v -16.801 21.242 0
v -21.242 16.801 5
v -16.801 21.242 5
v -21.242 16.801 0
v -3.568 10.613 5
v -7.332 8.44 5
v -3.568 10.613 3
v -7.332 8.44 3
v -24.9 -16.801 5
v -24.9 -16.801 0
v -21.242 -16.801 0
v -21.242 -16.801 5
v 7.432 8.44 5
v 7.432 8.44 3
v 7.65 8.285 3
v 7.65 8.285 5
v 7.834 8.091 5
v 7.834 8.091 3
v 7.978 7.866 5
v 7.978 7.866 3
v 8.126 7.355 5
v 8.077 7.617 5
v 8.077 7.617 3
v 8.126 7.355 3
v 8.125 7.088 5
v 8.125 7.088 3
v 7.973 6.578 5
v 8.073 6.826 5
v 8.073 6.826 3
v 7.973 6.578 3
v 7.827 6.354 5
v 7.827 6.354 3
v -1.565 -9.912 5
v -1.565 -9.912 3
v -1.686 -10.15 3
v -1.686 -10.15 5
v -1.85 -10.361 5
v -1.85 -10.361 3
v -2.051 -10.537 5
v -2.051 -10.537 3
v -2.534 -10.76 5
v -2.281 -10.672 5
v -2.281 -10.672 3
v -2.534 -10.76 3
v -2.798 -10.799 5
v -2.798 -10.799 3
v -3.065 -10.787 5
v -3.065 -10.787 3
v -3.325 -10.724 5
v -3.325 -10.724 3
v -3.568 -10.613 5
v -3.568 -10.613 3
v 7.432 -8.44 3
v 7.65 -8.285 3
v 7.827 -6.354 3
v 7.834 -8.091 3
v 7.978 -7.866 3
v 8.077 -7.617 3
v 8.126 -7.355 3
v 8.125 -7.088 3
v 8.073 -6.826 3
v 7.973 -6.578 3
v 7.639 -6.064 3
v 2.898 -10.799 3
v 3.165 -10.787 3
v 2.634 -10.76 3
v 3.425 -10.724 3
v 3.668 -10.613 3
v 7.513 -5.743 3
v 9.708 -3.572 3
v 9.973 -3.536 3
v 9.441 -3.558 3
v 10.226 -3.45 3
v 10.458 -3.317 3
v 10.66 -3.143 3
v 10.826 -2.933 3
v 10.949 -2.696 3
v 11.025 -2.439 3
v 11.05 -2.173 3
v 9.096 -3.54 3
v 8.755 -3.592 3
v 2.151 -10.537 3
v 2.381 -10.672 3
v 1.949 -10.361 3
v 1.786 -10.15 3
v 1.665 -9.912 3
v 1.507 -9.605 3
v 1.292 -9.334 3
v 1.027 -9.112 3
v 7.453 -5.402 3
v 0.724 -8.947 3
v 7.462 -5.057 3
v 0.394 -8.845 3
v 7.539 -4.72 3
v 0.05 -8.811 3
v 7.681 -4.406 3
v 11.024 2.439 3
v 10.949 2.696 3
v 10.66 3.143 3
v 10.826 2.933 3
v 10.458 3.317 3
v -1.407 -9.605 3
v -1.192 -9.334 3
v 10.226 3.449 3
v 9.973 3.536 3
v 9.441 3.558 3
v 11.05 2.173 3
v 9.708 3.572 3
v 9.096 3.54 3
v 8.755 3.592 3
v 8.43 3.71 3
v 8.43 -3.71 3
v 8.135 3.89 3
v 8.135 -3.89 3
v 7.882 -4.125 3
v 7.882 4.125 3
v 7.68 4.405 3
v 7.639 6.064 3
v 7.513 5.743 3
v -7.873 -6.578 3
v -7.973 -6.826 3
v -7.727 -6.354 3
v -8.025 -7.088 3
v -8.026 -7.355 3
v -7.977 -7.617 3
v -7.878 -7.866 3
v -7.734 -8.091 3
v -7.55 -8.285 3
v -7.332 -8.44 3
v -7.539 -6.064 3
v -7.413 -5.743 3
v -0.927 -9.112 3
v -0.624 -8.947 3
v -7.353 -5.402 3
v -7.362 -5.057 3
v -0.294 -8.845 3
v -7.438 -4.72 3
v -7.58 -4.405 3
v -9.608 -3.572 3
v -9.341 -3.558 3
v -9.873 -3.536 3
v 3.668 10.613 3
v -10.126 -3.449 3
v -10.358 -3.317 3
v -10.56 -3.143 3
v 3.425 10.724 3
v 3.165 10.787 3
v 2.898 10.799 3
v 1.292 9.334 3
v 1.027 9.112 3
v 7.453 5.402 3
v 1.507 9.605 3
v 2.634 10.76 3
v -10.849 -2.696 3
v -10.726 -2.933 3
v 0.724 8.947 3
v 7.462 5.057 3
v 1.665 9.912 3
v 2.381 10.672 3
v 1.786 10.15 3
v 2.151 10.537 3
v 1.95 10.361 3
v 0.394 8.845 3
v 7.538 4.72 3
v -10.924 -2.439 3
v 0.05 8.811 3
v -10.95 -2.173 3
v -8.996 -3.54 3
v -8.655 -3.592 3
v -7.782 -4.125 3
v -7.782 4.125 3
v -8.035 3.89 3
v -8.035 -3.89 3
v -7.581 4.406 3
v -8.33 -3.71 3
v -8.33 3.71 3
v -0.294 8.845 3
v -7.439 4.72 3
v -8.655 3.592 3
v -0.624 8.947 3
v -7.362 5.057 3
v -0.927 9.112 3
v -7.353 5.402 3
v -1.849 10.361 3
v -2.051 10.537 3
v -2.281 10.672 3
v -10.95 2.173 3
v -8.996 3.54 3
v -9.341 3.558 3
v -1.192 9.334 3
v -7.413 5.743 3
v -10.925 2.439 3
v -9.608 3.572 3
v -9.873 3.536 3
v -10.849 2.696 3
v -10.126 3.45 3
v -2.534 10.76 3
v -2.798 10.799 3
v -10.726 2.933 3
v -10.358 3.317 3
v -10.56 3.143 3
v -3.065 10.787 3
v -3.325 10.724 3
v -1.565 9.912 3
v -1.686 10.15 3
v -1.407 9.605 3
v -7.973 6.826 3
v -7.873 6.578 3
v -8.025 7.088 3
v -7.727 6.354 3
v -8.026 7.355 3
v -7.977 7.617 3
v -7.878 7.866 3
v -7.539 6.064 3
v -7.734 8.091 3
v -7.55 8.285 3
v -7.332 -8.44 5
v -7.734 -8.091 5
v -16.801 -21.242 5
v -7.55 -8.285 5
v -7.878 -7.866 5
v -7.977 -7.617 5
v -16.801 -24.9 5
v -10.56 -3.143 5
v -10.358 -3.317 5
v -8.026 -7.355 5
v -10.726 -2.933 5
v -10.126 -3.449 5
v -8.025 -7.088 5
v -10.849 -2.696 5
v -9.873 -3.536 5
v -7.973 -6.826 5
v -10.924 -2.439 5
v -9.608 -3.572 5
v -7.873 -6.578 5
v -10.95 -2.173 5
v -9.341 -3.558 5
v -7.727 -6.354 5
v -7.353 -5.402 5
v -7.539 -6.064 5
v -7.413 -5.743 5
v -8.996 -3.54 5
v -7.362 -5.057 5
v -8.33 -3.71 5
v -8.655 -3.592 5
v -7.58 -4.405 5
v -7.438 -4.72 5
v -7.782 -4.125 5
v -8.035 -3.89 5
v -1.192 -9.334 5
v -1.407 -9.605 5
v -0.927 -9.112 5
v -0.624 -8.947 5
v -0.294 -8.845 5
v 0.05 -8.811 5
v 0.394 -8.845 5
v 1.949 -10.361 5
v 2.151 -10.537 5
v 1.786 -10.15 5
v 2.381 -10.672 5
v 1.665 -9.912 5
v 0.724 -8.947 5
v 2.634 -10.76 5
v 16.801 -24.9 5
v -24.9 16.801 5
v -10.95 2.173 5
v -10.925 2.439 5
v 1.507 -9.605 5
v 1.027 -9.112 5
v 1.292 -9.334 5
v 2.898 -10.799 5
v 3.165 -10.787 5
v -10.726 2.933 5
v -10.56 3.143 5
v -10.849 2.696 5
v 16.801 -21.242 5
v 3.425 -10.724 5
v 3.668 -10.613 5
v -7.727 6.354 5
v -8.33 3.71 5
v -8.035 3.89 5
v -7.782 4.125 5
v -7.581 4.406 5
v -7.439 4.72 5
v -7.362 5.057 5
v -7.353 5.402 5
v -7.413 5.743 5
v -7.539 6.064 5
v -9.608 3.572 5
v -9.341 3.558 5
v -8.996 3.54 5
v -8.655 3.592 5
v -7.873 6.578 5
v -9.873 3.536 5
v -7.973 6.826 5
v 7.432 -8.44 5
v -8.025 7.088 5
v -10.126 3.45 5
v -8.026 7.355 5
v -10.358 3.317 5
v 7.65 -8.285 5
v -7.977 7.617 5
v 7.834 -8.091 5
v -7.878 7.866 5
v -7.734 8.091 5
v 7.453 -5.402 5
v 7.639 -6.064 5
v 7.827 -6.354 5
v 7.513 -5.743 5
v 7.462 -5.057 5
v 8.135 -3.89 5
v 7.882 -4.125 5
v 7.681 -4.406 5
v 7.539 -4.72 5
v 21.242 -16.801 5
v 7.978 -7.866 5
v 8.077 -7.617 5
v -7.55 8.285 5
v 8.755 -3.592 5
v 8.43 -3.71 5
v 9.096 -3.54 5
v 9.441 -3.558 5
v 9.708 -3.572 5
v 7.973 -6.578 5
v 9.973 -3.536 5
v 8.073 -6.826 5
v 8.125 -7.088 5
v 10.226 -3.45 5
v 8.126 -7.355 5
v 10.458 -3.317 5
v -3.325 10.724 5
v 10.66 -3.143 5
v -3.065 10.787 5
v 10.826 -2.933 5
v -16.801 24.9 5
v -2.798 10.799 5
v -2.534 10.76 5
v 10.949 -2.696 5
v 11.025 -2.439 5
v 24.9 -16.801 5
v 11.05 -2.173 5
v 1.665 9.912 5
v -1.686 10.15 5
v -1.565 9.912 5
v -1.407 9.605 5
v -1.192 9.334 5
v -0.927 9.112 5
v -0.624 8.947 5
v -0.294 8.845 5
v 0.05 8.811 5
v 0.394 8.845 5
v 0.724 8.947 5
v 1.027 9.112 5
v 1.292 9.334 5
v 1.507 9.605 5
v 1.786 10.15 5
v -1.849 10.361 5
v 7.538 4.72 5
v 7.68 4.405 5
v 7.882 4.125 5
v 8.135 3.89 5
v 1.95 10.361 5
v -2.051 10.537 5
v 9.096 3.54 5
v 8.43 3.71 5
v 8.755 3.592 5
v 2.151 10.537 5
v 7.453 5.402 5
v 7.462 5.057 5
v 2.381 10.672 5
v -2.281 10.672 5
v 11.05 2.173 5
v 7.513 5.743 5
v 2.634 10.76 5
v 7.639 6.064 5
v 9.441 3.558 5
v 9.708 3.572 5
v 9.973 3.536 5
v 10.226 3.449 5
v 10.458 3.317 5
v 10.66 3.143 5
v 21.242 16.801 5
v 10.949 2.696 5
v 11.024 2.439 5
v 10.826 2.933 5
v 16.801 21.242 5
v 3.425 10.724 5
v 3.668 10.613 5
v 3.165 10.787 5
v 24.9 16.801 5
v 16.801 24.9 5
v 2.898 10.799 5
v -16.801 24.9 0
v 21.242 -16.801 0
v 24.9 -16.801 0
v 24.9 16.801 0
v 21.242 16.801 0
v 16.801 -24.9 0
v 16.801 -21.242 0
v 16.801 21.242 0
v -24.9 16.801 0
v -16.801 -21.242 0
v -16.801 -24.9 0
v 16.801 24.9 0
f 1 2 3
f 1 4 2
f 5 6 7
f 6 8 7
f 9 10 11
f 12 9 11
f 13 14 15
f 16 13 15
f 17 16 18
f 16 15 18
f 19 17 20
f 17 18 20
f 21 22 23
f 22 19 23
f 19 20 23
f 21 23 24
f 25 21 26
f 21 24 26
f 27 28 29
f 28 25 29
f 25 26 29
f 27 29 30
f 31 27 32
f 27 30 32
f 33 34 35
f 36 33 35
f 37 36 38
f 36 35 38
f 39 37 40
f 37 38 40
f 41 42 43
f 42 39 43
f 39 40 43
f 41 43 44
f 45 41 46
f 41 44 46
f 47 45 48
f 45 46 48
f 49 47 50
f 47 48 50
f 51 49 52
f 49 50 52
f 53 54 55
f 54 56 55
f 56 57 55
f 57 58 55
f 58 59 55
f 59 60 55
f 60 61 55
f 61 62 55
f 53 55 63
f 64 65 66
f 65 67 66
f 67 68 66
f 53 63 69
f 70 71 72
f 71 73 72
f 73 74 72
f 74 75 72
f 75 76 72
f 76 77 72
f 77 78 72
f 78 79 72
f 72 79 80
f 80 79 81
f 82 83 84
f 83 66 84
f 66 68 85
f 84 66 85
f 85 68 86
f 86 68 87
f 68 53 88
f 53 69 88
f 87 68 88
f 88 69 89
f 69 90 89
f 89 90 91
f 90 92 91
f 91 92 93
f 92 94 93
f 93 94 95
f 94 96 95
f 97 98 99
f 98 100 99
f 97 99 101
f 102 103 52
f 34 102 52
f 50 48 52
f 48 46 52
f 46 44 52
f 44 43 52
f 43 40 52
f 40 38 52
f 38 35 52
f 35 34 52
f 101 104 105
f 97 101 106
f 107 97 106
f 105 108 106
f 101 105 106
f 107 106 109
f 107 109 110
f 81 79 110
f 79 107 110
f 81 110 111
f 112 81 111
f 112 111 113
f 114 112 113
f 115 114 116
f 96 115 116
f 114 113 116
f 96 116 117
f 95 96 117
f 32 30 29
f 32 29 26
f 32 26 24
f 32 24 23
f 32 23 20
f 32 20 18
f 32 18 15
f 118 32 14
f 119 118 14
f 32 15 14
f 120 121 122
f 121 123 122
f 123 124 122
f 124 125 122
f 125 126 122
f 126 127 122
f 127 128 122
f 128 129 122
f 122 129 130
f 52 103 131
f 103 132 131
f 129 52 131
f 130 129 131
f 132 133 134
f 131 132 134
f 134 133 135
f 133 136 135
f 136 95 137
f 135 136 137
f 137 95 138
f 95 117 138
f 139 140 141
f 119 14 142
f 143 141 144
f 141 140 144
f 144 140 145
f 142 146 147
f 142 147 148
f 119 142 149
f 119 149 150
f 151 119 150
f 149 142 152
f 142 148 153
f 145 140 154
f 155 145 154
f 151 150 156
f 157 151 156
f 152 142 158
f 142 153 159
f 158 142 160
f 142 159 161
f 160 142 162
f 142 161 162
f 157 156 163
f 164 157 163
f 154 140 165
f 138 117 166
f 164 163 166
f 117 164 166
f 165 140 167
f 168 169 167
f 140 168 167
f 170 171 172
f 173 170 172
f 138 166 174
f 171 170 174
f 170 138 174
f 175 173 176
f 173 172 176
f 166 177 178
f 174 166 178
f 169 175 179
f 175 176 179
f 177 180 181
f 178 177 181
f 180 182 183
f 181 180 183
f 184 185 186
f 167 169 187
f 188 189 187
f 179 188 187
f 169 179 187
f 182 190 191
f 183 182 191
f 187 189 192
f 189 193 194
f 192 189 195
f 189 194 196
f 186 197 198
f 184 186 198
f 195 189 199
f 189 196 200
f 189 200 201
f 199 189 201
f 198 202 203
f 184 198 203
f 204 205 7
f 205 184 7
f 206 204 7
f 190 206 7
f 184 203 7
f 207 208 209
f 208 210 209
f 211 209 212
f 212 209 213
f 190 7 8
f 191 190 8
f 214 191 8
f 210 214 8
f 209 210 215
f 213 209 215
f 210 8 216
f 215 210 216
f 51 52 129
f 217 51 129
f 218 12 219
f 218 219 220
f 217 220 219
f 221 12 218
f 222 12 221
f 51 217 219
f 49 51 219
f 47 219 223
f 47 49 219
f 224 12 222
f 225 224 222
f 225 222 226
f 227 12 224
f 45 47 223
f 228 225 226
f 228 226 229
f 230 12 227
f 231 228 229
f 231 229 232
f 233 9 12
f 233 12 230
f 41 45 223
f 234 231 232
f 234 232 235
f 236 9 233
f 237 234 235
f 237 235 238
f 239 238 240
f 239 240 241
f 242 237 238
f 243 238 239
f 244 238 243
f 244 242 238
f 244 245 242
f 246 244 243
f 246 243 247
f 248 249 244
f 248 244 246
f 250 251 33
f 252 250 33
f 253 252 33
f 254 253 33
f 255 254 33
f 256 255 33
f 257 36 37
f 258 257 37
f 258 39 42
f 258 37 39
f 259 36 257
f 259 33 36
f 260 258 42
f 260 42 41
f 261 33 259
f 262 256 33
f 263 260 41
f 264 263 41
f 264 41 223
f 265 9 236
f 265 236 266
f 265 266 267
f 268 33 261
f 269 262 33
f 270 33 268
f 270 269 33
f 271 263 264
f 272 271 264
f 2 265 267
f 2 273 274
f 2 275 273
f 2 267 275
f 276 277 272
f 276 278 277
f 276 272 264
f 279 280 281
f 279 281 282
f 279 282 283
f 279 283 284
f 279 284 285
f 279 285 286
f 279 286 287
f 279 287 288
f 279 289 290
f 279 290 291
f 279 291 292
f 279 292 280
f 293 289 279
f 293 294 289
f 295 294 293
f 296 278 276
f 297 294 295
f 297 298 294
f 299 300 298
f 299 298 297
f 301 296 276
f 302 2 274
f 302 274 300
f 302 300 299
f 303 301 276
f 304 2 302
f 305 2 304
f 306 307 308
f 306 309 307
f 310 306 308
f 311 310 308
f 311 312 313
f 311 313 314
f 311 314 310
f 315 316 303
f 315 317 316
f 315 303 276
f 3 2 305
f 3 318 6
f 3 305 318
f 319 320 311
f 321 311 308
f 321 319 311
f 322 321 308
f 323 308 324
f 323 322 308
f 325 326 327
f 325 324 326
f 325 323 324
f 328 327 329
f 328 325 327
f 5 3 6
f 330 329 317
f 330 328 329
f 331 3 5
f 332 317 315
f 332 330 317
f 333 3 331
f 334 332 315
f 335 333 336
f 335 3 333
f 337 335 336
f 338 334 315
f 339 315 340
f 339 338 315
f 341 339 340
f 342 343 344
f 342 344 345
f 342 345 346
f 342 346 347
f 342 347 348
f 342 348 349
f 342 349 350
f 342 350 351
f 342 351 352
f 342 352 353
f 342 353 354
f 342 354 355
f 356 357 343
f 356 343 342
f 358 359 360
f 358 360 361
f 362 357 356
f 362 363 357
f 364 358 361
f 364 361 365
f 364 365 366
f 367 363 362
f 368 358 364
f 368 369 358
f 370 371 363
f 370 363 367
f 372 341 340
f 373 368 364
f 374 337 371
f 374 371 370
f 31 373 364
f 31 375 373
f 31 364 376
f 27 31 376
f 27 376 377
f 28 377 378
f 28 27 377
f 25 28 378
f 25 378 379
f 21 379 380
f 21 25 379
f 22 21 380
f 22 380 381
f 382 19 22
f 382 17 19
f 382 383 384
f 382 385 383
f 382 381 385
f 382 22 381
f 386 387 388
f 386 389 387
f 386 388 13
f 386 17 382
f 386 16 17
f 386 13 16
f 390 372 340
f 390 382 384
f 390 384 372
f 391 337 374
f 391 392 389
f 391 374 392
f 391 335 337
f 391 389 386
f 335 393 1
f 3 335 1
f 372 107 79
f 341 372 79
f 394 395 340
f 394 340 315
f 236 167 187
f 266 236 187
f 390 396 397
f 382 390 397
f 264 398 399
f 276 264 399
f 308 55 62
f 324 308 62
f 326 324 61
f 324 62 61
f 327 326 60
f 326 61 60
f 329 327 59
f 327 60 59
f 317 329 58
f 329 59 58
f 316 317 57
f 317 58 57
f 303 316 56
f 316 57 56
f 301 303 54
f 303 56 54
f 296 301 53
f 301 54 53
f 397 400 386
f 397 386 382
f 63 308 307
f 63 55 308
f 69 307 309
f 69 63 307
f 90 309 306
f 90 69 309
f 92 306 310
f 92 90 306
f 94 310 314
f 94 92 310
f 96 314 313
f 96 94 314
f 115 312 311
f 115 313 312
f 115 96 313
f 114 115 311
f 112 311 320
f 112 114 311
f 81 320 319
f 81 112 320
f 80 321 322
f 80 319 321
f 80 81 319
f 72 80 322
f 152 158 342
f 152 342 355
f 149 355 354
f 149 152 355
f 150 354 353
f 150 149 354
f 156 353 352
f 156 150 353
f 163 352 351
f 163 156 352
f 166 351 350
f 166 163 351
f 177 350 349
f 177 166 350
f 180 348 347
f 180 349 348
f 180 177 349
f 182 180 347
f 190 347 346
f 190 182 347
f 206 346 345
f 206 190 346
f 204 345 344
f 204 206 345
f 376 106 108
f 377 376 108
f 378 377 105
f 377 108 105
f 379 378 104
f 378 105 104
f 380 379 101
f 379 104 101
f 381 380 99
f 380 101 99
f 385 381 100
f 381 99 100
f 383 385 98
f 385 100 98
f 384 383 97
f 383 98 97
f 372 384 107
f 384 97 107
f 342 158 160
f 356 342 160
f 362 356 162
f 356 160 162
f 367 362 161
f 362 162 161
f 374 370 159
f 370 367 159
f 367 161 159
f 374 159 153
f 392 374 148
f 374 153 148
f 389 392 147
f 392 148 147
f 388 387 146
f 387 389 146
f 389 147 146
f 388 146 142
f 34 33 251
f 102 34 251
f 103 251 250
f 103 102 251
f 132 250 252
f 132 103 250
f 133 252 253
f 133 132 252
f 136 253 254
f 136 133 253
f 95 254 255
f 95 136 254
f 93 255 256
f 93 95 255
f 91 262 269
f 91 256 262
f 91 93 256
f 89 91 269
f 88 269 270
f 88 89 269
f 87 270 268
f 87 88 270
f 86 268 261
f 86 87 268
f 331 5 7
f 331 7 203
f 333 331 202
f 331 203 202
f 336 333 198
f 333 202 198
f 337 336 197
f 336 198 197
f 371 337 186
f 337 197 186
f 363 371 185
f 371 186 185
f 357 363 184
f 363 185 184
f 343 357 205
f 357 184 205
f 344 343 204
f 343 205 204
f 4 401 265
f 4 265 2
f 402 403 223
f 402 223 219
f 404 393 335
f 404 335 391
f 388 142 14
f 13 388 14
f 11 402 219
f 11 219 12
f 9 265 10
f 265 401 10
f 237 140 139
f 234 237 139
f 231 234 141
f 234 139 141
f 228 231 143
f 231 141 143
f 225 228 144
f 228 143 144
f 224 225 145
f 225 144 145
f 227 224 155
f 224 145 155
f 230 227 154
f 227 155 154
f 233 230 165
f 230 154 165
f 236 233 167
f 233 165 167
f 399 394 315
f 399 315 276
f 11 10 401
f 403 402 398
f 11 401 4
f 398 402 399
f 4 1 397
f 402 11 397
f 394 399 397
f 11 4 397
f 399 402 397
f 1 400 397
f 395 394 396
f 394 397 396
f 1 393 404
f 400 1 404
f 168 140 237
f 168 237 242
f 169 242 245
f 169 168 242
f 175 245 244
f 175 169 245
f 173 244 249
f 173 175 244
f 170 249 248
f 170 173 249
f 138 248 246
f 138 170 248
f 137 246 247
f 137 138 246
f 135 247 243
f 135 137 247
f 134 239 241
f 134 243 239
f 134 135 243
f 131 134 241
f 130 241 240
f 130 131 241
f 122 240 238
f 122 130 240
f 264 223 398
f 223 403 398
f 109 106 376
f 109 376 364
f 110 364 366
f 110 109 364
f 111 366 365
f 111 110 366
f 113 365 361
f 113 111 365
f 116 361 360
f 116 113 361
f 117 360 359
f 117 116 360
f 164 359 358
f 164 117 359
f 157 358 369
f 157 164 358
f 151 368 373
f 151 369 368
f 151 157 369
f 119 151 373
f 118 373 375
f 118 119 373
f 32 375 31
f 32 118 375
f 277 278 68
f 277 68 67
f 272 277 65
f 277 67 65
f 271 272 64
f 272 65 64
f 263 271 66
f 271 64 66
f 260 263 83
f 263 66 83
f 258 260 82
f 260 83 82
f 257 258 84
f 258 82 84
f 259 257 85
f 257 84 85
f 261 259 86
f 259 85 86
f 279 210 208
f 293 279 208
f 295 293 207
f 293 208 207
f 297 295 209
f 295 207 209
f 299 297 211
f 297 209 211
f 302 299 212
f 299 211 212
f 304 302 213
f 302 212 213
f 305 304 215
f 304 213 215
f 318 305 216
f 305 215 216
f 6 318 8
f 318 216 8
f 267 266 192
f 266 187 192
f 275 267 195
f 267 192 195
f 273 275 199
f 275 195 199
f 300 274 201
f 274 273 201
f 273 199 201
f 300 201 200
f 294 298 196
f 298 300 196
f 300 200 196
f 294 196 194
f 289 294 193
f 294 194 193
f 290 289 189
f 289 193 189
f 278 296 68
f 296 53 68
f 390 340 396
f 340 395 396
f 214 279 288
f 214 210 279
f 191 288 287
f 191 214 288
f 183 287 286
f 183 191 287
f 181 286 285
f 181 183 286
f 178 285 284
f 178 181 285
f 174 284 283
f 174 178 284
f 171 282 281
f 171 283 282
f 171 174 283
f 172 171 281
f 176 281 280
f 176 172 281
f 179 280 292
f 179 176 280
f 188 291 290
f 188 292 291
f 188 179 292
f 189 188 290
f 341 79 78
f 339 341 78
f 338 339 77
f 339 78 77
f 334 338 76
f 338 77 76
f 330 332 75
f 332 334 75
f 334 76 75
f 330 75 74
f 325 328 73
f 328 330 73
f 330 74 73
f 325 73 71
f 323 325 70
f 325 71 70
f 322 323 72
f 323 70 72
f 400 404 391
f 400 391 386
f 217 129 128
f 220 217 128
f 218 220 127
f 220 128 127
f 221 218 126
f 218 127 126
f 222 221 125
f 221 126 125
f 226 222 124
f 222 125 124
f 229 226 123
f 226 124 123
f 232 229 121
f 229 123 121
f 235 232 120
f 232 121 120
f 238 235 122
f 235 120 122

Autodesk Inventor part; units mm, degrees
ref_plane "YZ Plane" through (0, 0, 0) normal (1, 0, 0) x (0, 1, 0)
ref_plane "XZ Plane" through (0, 0, 0) normal (0, 1, 0) x (-1, 0, 0)
ref_plane "XY Plane" through (0, 0, 0) normal (0, 0, 1) x (1, 0, 0)
sketch "Sketch1" plane through (0, 0, 0) normal (0, 0, 1) x (1, 0, 0)
  line L0 (-34.86, 0) -> (34.86, 0) construction
  line L1 (0, -34.86) -> (0, 34.86) construction
  line L2 (0, 0) -> (11.1575, 11.1575) construction
  line L3 (0, 0) -> (15.7791, 0) construction
  line L4 (0, 24.9) -> (16.8009, 24.9)
  line L5 (16.8009, 24.9) -> (16.8009, 21.2415)
  line L6 (16.8009, 21.2415) -> (19.0212, 19.0212)
  line L7 (24.9, 0) -> (24.9, 16.8009)
  line L8 (24.9, 16.8009) -> (21.2415, 16.8009)
  line L9 (21.2415, 16.8009) -> (19.0212, 19.0212)
  line L10 (0, -24.9) -> (16.8009, -24.9)
  line L11 (16.8009, -24.9) -> (16.8009, -21.2415)
  line L12 (16.8009, -21.2415) -> (19.0212, -19.0212)
  line L13 (24.9, 0) -> (24.9, -16.8009)
  line L14 (24.9, -16.8009) -> (21.2415, -16.8009)
  line L15 (21.2415, -16.8009) -> (19.0212, -19.0212)
  line L16 (0, 24.9) -> (-16.8009, 24.9)
  line L17 (-16.8009, 24.9) -> (-16.8009, 21.2415)
  line L18 (-16.8009, 21.2415) -> (-19.0212, 19.0212)
  line L19 (-24.9, 16.8009) -> (-21.2415, 16.8009)
  line L20 (-21.2415, 16.8009) -> (-19.0212, 19.0212)
  line L21 (0, -24.9) -> (-16.8009, -24.9)
  line L22 (-16.8009, -24.9) -> (-16.8009, -21.2415)
  line L23 (-16.8009, -21.2415) -> (-19.0212, -19.0212)
  line L24 (-21.2415, -16.8009) -> (-19.0212, -19.0212)
  line L25 (-24.9, -16.8009) -> (-21.2415, -16.8009)
  line L26 (-24.9, 0) -> (-24.9, -16.8009)
  line L27 (-24.9, 0) -> (-24.9, 16.8009)
  circle A0 centre (0, 0) radius 12.5
  dimension "d0" = 45
  dimension "d2" = 24.9
  dimension "d3" = 3.14
  dimension "d4" = 26.9
  dimension "d5" = 25
extrude "Extrusion1" add sketch "Sketch1" along normal blind 5
sketch "Sketch3" plane through (0, 0, 0) normal (0, 0, -1) x (-1, 0, 0)
  circle A0 centre (0, 0) radius 12.5 projected
extrude "Extrusion3" add sketch "Sketch3" against normal blind 3
sketch "Sketch4" plane through (0, 0, 3) normal (0, 0, 1) x (1, 0, 0)
  circle A0 centre (0, 0) radius 12.5 projected
  arc A1 (-2.4955, 9.5466) -> (0.05, 7.811) centre (0.05, 10.5454) ccw projected
  arc A2 (-2.4955, 9.5466) -> (-3.0679, 9.7469) centre (-2.8679, 9.4005) ccw projected
  line L0 (-3.0679, 9.7469) -> (-6.8321, 7.5736) projected
  arc A3 (-6.8321, 7.5736) -> (-6.9449, 6.9778) centre (-6.6321, 7.2272) ccw projected
  arc A4 (-6.7145, 3.9055) -> (-6.9449, 6.9778) centre (-9.0826, 5.2727) ccw projected
  arc A5 (2.5955, -9.5466) -> (0.05, -7.811) centre (0.05, -10.5454) ccw projected
  arc A6 (2.5955, -9.5466) -> (3.1679, -9.7469) centre (2.9679, -9.4005) ccw projected
  line L1 (3.1679, -9.7469) -> (6.9321, -7.5736) projected
  arc A7 (6.9321, -7.5736) -> (7.0449, -6.9778) centre (6.7321, -7.2272) ccw projected
  arc A8 (6.8145, -3.9055) -> (7.0449, -6.9778) centre (9.1826, -5.2727) ccw projected
  line L2 (5.3229, -1.93) -> (5.3229, -1.58) projected
  line L3 (5.3229, -1.58) -> (5.4719, -1.58) projected
  line L4 (6.0377, -2.56) -> (5.9268, -2.56) projected
  line L5 (5.9268, -2.56) -> (5.9268, -2.3679) projected
  line L6 (5.674, -1.93) -> (5.3229, -1.93) projected
  circle A9 centre (0.05, 0) radius 3.3699 projected
  line L7 (1.2704, -6.4878) -> (4.6724, -4.4373) projected
  line L8 (4.6724, -4.4373) -> (5.9738, -6.5964) projected
  line L9 (5.9738, -6.5964) -> (2.5718, -8.647) projected
  line L10 (2.5718, -8.647) -> (1.2704, -6.4878) projected
  line L11 (-2.4718, 8.647) -> (-1.1704, 6.4878) projected
  line L12 (-1.1704, 6.4878) -> (-4.5724, 4.4373) projected
  line L13 (-4.5724, 4.4373) -> (-5.8738, 6.5964) projected
  line L14 (-5.8738, 6.5964) -> (-2.4718, 8.647) projected
  arc A10 (-3.5679, -10.6129) -> (-1.5646, -9.9119) centre (-2.8679, -9.4005) ccw
  line L15 (-3.5679, -10.6129) -> (-7.3321, -8.4396)
  arc A11 (-7.7266, -6.3542) -> (-7.3321, -8.4396) centre (-6.6321, -7.2272) ccw
  arc A12 (-7.7266, -6.3542) -> (-9.3412, -3.5577) centre (-9.0826, -5.2727) ccw
  arc A13 (-10.95, -2.1733) -> (-9.3412, -3.5577) centre (-9.55, -2.1733) ccw
  line L16 (-10.95, -2.1733) -> (-10.95, 2.1733)
  arc A14 (-9.3412, 3.5577) -> (-10.95, 2.1733) centre (-9.55, 2.1733) ccw
  arc A15 (-9.3412, 3.5577) -> (-7.7266, 6.3542) centre (-9.0826, 5.2727) ccw
  arc A16 (-7.3321, 8.4396) -> (-7.7266, 6.3542) centre (-6.6321, 7.2272) ccw
  line L17 (-7.3321, 8.4396) -> (-3.5679, 10.6129)
  arc A17 (-1.5646, 9.9119) -> (-3.5679, 10.6129) centre (-2.8679, 9.4005) ccw
  arc A18 (-1.5646, 9.9119) -> (1.6646, 9.9119) centre (0.05, 10.5454) ccw
  arc A19 (3.6679, 10.6129) -> (1.6646, 9.9119) centre (2.9679, 9.4005) ccw
  line L18 (3.6679, 10.6129) -> (7.4321, 8.4396)
  arc A20 (7.8266, 6.3542) -> (7.4321, 8.4396) centre (6.7321, 7.2272) ccw
  arc A21 (7.8266, 6.3542) -> (9.4412, 3.5577) centre (9.1826, 5.2727) ccw
  arc A22 (11.05, 2.1733) -> (9.4412, 3.5577) centre (9.65, 2.1733) ccw
  line L19 (11.05, 2.1733) -> (11.05, -2.1733)
  arc A23 (9.4412, -3.5577) -> (11.05, -2.1733) centre (9.65, -2.1733) ccw
  arc A24 (9.4412, -3.5577) -> (7.8266, -6.3542) centre (9.1826, -5.2727) ccw
  arc A25 (7.4321, -8.4396) -> (7.8266, -6.3542) centre (6.7321, -7.2272) ccw
  line L20 (7.4321, -8.4396) -> (3.6679, -10.6129)
  arc A26 (1.6646, -9.9119) -> (3.6679, -10.6129) centre (2.9679, -9.4005) ccw
  arc A27 (1.6646, -9.9119) -> (-1.5646, -9.9119) centre (0.05, -10.5454) ccw
  line L21 (-6.7145, 3.9055) -> (0.05, -7.811) projected
  line L22 (6.8145, -3.9055) -> (6.0377, -2.56) projected
  line L23 (5.9268, -2.3679) -> (5.674, -1.93) projected
  line L24 (5.4719, -1.58) -> (0.05, 7.811) projected
  dimension "d15" = 1
extrude "Extrusion4" add sketch "Sketch4" along normal up to surface (2 mm away) contours A0
properties part number "20_Cube_insert_Sample_holder"
